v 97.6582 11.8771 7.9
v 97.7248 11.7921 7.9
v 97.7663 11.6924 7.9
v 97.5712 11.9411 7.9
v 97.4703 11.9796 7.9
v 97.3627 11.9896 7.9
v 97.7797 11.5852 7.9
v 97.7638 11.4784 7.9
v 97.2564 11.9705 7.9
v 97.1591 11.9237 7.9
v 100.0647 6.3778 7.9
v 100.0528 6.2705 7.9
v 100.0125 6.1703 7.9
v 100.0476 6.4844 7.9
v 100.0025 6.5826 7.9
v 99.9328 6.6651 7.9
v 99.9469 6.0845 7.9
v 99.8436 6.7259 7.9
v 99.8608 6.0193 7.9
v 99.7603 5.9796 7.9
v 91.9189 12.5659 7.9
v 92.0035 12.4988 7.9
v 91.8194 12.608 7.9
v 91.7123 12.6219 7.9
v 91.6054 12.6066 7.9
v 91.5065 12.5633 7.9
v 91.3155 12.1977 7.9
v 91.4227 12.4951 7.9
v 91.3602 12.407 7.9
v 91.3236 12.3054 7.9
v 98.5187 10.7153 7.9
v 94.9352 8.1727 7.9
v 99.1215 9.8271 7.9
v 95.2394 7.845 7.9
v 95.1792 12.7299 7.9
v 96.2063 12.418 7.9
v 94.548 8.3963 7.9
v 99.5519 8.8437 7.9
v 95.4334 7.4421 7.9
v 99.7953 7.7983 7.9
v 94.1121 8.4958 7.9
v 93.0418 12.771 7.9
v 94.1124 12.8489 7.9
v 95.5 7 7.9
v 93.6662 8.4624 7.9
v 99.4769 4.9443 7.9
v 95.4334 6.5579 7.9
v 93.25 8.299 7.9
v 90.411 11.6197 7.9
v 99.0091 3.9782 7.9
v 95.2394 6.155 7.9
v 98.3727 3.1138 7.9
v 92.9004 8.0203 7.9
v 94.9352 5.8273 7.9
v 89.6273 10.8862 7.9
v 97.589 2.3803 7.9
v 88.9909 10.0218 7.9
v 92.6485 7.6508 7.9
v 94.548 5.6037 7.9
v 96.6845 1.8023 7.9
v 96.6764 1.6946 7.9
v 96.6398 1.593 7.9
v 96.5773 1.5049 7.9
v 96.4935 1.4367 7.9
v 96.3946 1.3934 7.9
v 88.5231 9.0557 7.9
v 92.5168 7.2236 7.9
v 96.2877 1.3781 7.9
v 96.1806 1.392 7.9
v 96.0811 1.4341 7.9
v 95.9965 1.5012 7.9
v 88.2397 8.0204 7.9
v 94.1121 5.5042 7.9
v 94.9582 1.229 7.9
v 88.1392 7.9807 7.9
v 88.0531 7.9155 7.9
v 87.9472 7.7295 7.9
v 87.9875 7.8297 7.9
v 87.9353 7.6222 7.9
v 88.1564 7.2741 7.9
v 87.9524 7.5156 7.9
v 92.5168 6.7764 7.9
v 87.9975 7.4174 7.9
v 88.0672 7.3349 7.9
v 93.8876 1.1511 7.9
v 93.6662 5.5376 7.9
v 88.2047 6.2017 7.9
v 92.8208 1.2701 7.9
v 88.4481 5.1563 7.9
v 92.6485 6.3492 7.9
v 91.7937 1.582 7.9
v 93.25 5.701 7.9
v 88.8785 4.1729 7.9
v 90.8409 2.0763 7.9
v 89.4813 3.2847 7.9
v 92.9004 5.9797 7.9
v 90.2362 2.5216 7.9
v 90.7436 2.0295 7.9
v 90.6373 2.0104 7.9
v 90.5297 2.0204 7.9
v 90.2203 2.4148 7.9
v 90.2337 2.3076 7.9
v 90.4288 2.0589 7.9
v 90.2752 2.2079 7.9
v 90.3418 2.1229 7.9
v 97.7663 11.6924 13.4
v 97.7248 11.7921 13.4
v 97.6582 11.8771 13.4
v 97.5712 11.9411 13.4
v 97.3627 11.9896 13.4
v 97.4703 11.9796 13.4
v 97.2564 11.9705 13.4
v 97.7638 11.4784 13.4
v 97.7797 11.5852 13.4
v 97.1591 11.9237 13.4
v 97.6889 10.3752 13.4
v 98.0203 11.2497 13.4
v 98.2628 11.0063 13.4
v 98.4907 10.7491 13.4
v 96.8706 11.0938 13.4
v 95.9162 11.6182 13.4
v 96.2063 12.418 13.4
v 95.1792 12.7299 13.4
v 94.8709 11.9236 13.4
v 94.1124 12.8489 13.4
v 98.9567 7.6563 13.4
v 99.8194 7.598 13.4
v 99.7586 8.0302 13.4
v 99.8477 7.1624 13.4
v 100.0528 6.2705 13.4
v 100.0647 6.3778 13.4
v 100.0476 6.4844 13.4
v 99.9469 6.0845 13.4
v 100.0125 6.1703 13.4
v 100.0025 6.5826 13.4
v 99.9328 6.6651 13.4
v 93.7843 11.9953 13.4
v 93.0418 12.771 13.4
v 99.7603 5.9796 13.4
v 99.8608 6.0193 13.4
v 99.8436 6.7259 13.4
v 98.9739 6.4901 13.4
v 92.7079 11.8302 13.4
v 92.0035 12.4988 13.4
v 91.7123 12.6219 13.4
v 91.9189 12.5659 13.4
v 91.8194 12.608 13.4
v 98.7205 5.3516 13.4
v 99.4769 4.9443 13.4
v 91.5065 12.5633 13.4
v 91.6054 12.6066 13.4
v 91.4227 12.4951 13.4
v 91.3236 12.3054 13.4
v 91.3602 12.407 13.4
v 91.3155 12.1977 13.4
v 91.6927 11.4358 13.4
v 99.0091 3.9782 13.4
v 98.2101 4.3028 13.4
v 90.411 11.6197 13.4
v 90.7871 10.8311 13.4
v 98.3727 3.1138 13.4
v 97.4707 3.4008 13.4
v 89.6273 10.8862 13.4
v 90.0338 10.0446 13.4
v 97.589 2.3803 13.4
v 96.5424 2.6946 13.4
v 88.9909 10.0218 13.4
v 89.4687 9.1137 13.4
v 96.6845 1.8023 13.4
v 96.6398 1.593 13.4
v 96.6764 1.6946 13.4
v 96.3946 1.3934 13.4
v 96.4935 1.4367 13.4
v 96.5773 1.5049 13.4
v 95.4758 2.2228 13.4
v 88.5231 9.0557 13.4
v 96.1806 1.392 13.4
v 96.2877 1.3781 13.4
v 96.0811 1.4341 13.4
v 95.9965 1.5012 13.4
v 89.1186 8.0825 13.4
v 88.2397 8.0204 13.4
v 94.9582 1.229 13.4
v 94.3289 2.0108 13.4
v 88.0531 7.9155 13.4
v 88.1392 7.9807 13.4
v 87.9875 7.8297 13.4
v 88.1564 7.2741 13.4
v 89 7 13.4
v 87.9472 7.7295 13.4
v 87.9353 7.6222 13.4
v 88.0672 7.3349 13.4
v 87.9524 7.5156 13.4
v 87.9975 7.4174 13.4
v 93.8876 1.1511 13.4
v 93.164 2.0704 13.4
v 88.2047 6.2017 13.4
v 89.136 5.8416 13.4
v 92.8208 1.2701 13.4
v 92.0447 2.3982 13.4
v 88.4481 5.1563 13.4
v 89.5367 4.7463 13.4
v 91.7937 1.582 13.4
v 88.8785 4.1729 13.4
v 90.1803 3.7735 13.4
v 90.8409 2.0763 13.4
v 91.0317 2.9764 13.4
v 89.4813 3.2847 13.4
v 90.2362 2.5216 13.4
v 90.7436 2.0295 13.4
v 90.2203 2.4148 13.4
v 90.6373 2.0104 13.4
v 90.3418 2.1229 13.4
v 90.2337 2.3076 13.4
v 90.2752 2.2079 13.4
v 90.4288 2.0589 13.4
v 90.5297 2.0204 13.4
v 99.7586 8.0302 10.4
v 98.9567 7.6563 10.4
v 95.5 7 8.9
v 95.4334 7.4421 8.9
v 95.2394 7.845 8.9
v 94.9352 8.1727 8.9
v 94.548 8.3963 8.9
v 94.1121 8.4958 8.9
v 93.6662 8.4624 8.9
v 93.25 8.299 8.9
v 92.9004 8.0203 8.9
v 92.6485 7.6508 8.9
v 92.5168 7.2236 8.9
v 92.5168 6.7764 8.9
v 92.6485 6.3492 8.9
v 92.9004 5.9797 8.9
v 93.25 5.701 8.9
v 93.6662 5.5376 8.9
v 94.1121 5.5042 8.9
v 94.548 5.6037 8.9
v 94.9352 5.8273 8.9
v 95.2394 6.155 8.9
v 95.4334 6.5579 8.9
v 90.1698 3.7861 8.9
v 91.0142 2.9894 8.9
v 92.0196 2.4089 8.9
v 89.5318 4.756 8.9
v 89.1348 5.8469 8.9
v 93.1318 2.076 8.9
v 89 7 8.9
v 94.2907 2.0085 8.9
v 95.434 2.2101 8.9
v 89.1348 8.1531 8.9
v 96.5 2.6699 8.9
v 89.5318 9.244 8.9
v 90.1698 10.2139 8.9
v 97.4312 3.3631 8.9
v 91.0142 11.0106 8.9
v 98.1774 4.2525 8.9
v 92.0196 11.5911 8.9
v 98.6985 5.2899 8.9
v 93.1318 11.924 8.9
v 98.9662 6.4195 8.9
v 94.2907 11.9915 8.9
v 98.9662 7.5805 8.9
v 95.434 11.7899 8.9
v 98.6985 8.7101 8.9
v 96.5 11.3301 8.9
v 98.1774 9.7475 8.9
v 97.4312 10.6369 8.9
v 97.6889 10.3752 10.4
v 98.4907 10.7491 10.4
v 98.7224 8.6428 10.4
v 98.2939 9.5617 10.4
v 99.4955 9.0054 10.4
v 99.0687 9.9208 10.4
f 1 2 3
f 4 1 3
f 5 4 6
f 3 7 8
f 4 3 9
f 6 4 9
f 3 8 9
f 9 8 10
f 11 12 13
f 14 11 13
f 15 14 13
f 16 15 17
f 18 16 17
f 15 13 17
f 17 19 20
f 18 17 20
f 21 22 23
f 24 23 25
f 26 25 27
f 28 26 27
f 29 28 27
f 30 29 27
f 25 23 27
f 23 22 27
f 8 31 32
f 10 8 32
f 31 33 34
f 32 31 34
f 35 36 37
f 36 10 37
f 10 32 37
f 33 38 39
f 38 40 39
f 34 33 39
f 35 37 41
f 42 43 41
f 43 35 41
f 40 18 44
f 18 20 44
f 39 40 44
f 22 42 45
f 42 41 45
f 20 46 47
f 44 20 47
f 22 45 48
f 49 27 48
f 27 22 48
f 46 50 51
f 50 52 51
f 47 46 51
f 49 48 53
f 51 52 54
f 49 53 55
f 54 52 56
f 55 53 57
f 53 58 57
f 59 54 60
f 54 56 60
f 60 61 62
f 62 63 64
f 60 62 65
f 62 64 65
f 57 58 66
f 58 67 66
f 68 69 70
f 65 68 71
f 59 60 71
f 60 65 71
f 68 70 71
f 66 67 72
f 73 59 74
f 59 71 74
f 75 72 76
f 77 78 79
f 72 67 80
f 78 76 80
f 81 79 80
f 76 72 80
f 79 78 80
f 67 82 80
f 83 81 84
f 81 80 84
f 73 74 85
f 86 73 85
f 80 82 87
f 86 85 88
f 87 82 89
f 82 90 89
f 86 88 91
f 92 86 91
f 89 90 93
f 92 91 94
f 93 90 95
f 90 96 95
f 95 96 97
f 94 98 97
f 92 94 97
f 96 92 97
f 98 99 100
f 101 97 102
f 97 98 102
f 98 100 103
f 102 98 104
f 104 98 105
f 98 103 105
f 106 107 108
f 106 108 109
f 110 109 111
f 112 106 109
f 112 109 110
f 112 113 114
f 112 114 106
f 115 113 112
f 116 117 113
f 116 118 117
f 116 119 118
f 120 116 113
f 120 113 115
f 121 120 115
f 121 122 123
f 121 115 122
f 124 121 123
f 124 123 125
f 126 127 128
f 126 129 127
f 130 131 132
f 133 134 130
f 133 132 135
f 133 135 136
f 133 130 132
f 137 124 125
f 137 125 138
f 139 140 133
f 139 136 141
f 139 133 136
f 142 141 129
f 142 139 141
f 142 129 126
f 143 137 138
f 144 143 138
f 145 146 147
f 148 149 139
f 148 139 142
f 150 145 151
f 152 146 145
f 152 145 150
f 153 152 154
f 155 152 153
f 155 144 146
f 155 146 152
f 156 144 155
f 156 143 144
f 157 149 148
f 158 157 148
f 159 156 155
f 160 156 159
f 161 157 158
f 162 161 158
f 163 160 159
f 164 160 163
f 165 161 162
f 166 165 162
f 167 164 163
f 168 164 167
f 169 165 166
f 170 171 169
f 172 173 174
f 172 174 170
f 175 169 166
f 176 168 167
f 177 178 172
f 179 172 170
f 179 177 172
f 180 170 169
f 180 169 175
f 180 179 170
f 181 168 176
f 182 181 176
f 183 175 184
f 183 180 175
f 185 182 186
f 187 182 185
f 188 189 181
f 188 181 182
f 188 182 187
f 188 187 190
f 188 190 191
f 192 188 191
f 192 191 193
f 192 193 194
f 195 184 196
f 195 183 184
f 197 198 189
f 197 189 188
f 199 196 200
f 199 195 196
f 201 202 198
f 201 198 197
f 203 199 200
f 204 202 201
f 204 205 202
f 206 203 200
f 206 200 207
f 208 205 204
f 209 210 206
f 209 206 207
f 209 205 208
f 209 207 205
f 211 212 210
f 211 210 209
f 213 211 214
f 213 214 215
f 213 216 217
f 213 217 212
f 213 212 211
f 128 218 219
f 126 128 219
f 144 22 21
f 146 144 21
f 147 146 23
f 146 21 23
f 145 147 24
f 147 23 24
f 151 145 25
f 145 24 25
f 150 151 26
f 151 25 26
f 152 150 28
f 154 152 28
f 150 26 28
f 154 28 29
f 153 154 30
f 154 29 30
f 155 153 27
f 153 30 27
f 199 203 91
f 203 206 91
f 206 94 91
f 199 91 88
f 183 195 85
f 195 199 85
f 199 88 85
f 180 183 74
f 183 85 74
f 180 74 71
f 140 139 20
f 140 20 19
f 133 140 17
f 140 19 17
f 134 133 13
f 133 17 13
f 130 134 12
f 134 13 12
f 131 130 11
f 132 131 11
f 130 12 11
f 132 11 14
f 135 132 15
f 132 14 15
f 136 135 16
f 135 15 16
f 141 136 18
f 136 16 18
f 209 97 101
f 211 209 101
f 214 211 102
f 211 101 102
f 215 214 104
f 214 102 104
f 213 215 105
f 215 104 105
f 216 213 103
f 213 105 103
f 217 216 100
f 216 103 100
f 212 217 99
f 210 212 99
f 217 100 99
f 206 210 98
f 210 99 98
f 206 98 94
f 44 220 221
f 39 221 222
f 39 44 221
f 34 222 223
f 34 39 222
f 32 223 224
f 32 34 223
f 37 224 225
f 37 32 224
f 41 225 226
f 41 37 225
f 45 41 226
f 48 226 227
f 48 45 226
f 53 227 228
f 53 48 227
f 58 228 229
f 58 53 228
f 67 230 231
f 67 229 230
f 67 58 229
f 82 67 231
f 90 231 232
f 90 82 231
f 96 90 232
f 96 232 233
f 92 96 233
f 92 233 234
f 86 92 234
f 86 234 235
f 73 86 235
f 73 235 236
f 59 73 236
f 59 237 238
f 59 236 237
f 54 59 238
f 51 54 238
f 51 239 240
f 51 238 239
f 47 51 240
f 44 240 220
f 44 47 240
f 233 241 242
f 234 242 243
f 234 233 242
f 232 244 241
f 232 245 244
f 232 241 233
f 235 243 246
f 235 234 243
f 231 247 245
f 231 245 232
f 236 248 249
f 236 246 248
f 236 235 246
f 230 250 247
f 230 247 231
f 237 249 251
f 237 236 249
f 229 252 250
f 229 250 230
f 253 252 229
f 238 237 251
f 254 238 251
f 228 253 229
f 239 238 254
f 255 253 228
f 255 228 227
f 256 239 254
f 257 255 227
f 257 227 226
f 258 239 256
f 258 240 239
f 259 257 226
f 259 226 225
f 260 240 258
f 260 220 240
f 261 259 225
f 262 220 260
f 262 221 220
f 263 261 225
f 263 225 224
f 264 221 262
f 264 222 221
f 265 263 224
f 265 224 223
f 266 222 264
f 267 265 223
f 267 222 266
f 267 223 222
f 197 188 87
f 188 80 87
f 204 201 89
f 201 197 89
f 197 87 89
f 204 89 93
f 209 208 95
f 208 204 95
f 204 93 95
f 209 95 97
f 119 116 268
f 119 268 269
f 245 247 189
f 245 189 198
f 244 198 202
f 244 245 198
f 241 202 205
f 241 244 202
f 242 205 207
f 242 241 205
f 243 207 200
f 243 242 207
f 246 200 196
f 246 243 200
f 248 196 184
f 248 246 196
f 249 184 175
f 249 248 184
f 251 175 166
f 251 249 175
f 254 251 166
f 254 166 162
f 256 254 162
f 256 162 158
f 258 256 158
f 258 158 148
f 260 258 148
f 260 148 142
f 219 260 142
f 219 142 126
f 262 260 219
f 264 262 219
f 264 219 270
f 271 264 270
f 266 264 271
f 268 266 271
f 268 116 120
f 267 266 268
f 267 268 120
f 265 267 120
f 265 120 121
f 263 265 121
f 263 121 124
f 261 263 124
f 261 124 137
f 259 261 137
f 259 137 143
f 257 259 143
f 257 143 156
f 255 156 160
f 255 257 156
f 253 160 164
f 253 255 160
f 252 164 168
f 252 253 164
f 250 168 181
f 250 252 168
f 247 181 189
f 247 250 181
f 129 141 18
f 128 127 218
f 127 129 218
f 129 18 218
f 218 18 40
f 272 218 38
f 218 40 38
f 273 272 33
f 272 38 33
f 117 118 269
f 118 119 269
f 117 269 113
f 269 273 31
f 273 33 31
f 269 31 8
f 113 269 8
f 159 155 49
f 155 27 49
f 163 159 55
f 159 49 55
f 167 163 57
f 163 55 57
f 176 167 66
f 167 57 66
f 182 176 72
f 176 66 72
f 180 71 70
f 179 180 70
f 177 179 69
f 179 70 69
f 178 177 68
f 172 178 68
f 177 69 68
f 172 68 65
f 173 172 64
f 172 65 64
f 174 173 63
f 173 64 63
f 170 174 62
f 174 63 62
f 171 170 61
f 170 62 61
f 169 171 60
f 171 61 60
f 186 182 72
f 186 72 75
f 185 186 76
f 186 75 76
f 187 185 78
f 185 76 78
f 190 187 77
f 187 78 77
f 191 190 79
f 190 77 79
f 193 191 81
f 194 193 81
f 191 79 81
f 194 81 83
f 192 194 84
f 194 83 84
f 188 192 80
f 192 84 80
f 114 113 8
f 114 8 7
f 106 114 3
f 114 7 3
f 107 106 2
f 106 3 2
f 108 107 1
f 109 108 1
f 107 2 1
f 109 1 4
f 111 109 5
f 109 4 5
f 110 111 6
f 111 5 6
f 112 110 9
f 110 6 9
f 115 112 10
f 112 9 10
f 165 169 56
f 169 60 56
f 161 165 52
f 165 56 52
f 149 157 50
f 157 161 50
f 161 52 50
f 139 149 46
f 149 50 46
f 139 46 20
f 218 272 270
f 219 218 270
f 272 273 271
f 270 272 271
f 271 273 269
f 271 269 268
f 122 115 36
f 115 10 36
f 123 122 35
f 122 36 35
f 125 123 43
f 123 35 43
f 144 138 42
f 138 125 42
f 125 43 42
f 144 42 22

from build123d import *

# Parameters (mm, degrees)
SKIZZE2_R                       = 5
AUFSATZ_LINEAR_AUSTRAGEN1_DEPTH = 1
SKIZZE2_4_R                     = 5.85
SKIZZE2_4_R_2                   = 5
AUFSATZ_LINEAR_AUSTRAGEN2_DEPTH = 5.5
SKIZZE3_R                       = 0.4
AUFSATZ_LINEAR_AUSTRAGEN3_DEPTH = 5.5
KREISMUSTER1_COUNT              = 6
SCHNITT_LINEAR_AUSTRAGEN1_DEPTH = 3
SKIZZE5_R                       = 1.5
SCHNITT_LINEAR_AUSTRAGEN2_DEPTH = 102.03637778


with BuildPart() as part:
    # Skizze2 → Aufsatz-Linear austragen1 (new body)
    with BuildSketch(Plane.XY.offset(7.9)):
        with Locations((94, 7)):
            Circle(SKIZZE2_R)
    extrude(amount=AUFSATZ_LINEAR_AUSTRAGEN1_DEPTH)

    # Skizze2<4> → Aufsatz-Linear austragen2 (add)
    with BuildSketch(Plane.XY.offset(7.9)):
        with Locations(Location((94, 7, 0), (0, 0, 180))):
            Circle(SKIZZE2_4_R)
        with Locations(Location((94, 7, 0), (0, 0, 180))):
            Circle(SKIZZE2_4_R_2, mode=Mode.SUBTRACT)
    extrude(amount=AUFSATZ_LINEAR_AUSTRAGEN2_DEPTH)

    # Skizze3 → Aufsatz-Linear austragen3 (add)
    with BuildSketch(Plane.XY.offset(7.9)):
        with Locations((91.714816695, 12.22187105)):
            Circle(SKIZZE3_R)
    aufsatz_linear_austragen3 = extrude(amount=AUFSATZ_LINEAR_AUSTRAGEN3_DEPTH)

    # Kreismuster1: Aufsatz-Linear austragen3 ×6 about axis
    kreismuster1_axis = Axis((94, 7, 0), (0, 0, 1))
    for i in range(1, KREISMUSTER1_COUNT):
        add(aufsatz_linear_austragen3.rotate(kreismuster1_axis, i * 360 / KREISMUSTER1_COUNT))

    # Skizze4 → Schnitt-Linear austragen1 (cut)
    with BuildSketch(Plane.XY.offset(13.4)):
        Polygon((93.366072607, 8.359461681), (100.290761443, 11.588497115), (101.558616228, 8.869573754), (94.633927393, 5.640538319), align=None)
    extrude(amount=-SCHNITT_LINEAR_AUSTRAGEN1_DEPTH, mode=Mode.SUBTRACT)

    # Skizze5 → Schnitt-Linear austragen2 (cut, through all)
    with BuildSketch(Plane.XY.offset(7.9)):
        with Locations((94, 7)):
            Circle(SKIZZE5_R)
    extrude(amount=SCHNITT_LINEAR_AUSTRAGEN2_DEPTH, mode=Mode.SUBTRACT)


solid = part.part
